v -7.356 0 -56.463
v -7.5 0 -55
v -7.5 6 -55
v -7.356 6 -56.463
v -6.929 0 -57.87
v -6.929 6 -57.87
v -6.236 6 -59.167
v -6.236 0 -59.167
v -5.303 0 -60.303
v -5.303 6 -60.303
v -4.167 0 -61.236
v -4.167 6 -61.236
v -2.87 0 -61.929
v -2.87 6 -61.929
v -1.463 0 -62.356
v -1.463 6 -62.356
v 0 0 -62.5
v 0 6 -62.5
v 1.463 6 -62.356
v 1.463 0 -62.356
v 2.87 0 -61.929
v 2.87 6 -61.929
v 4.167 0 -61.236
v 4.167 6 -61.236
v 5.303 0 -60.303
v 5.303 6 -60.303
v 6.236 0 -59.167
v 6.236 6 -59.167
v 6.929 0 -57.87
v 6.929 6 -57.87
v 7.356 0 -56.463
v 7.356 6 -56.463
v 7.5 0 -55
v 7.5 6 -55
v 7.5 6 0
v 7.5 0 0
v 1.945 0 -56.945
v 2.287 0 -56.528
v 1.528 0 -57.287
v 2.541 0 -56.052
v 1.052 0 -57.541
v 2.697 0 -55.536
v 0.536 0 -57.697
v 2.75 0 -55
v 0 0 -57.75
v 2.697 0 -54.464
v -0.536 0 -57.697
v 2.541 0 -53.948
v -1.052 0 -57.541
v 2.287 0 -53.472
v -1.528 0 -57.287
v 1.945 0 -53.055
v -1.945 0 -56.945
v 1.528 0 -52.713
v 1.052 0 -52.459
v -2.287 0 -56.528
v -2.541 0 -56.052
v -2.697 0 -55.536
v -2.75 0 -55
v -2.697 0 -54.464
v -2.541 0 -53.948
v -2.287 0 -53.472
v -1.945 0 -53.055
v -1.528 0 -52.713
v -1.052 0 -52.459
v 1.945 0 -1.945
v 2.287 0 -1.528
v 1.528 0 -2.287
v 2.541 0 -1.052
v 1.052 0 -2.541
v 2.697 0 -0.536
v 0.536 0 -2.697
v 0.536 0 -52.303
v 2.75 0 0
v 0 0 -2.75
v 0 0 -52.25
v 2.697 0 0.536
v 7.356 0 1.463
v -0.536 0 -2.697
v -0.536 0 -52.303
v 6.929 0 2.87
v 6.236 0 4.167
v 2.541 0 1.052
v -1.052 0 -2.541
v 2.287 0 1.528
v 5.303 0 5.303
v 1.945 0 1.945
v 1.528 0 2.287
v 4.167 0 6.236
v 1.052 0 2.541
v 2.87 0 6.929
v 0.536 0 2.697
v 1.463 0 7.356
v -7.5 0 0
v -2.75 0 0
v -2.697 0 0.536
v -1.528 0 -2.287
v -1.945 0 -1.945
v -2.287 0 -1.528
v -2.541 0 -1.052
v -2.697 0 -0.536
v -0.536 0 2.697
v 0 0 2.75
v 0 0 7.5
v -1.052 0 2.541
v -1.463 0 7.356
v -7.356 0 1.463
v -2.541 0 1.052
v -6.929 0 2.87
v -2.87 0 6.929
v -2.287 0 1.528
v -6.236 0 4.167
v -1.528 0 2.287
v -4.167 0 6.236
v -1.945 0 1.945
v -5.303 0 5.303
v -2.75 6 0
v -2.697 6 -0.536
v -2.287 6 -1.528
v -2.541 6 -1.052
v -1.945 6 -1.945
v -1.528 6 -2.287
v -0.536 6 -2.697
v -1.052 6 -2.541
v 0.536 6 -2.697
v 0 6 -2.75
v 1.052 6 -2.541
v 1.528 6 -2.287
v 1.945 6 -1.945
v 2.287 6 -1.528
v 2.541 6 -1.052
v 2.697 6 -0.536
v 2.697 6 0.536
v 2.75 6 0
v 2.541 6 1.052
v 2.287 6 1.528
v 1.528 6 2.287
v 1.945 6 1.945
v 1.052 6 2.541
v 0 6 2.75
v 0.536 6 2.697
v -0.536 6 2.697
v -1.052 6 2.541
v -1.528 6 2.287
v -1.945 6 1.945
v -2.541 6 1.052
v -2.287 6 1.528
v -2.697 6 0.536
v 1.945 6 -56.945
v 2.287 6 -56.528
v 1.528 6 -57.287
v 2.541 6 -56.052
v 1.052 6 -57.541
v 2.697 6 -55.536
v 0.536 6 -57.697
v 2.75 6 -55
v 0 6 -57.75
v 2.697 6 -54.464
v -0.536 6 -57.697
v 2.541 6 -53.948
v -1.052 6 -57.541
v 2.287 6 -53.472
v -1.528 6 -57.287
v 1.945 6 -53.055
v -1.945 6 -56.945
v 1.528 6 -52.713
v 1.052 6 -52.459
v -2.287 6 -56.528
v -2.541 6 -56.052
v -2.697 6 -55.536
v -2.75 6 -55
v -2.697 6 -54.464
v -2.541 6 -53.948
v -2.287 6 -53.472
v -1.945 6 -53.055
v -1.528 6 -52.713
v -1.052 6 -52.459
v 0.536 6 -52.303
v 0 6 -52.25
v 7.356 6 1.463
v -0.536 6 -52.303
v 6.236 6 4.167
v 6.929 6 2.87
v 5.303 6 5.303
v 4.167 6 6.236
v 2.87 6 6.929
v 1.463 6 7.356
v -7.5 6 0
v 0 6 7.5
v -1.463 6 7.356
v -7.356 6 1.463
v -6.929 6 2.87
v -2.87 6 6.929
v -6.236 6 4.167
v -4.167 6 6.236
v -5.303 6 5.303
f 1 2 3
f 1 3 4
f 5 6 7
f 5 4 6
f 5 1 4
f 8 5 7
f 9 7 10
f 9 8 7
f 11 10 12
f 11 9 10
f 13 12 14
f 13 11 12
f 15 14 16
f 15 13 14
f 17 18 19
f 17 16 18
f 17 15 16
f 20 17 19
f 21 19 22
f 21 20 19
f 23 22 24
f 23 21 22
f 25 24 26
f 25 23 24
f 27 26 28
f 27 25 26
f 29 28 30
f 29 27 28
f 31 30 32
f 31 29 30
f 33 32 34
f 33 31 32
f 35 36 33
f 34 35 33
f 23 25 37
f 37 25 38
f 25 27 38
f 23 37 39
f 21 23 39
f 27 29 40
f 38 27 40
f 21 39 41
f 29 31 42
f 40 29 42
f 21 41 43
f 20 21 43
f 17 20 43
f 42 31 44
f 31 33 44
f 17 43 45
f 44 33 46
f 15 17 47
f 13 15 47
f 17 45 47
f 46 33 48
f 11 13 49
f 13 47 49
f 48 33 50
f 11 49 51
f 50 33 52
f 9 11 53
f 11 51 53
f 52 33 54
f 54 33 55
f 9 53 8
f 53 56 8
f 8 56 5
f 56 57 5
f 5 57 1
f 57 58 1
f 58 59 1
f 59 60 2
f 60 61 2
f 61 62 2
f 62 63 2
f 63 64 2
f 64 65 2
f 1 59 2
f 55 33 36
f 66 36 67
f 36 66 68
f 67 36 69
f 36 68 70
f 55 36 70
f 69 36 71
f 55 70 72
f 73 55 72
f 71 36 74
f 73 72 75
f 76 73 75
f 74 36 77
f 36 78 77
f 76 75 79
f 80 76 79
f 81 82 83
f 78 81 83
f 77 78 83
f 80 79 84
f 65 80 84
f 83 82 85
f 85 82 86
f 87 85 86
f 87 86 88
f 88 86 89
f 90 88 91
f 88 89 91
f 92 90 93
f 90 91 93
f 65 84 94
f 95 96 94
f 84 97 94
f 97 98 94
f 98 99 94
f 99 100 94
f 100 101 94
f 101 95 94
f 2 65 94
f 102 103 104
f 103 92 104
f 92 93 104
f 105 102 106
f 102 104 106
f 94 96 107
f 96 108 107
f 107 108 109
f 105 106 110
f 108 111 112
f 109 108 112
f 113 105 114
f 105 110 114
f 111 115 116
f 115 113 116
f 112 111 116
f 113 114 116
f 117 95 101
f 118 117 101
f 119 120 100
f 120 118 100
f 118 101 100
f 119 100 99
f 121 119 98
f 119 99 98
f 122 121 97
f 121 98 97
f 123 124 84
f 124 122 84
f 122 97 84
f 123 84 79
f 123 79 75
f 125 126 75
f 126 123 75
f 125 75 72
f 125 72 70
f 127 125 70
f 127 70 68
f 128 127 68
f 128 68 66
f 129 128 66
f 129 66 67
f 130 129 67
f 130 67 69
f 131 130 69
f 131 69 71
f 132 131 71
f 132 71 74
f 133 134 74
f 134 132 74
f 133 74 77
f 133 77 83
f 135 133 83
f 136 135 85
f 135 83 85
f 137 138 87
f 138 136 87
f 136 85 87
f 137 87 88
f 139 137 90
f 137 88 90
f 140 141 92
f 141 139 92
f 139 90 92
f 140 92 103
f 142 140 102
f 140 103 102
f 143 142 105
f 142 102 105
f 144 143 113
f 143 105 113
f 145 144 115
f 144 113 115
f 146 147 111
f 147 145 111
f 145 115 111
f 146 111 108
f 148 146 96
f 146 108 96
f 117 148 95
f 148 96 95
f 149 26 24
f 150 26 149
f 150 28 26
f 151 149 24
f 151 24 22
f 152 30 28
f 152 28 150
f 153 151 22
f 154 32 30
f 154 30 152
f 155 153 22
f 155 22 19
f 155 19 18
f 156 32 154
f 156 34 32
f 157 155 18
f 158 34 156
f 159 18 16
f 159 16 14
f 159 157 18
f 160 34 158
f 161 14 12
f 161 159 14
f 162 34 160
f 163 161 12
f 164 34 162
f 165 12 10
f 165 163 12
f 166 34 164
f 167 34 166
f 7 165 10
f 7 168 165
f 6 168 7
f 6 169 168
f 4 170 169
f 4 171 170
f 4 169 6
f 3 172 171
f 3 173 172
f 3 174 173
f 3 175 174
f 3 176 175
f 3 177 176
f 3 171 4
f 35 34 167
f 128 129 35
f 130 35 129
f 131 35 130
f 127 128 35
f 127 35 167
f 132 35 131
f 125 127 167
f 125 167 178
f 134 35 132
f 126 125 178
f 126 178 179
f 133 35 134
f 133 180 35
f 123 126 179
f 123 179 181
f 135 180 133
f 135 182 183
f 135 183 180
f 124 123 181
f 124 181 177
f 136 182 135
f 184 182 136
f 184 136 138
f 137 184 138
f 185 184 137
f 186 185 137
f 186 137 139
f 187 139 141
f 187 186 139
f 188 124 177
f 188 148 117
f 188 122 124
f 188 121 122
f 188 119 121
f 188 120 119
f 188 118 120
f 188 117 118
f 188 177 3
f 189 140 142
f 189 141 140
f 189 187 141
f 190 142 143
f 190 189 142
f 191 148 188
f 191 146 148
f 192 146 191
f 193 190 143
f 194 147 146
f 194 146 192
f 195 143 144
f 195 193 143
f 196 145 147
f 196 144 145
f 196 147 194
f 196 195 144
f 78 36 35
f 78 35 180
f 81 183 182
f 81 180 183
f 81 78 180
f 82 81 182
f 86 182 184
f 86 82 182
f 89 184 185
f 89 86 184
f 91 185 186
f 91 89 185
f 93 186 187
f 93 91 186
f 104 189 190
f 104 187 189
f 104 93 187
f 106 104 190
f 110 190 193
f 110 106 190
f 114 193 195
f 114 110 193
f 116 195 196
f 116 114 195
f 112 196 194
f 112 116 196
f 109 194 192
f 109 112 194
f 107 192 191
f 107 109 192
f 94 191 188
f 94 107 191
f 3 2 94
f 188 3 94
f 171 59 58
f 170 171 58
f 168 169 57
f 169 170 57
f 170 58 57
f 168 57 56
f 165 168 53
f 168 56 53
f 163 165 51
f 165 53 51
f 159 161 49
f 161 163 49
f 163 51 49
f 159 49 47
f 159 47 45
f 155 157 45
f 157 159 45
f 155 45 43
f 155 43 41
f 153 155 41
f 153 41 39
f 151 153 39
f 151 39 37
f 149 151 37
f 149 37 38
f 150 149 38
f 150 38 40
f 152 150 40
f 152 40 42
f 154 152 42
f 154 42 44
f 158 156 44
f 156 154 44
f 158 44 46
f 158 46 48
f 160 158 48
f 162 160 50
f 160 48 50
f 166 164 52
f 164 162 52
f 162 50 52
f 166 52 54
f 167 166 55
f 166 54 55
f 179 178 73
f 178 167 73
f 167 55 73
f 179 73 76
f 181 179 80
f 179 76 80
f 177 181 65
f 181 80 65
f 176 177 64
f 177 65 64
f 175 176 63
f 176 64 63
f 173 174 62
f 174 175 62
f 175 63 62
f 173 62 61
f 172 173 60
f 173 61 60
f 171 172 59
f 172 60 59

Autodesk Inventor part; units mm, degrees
ref_plane "YZ Plane" through (0, 0, 0) normal (1, 0, 0) x (0, 1, 0)
ref_plane "XZ Plane" through (0, 0, 0) normal (0, 1, 0) x (-1, 0, 0)
sketch "Sketch1" plane through (0, 0, 0) normal (0, 1, 0) x (-1, 0, 0)
  circle A0 centre (0, 0) radius 2.75
  line L0 (0, 0) -> (0, -55) construction
  circle A1 centre (0, -55) radius 2.75
  line L1 (0, 0) -> (0, -55) construction
  line L2 (-7.5, 0) -> (-7.5, -55)
  line L3 (7.5, -55) -> (7.5, 0)
  arc A2 (7.5, 0) -> (-7.5, 0) centre (0, 0) ccw
  arc A3 (-7.5, -55) -> (7.5, -55) centre (0, -55) ccw
  point P0 (0, -27.5)
  dimension "d0" = 5.5
  dimension "d1" = 55
  dimension "d2" = 5.5
  dimension "d3" = 15
extrude "Extrusion1" add sketch "Sketch1" along normal blind 6
ref_plane "Work Plane1" through (0, 0, -27.5) normal (0, 0, 1) x (1, 0, 0)
properties part number "BaseTensionBracket" material "Aluminum 6061"
